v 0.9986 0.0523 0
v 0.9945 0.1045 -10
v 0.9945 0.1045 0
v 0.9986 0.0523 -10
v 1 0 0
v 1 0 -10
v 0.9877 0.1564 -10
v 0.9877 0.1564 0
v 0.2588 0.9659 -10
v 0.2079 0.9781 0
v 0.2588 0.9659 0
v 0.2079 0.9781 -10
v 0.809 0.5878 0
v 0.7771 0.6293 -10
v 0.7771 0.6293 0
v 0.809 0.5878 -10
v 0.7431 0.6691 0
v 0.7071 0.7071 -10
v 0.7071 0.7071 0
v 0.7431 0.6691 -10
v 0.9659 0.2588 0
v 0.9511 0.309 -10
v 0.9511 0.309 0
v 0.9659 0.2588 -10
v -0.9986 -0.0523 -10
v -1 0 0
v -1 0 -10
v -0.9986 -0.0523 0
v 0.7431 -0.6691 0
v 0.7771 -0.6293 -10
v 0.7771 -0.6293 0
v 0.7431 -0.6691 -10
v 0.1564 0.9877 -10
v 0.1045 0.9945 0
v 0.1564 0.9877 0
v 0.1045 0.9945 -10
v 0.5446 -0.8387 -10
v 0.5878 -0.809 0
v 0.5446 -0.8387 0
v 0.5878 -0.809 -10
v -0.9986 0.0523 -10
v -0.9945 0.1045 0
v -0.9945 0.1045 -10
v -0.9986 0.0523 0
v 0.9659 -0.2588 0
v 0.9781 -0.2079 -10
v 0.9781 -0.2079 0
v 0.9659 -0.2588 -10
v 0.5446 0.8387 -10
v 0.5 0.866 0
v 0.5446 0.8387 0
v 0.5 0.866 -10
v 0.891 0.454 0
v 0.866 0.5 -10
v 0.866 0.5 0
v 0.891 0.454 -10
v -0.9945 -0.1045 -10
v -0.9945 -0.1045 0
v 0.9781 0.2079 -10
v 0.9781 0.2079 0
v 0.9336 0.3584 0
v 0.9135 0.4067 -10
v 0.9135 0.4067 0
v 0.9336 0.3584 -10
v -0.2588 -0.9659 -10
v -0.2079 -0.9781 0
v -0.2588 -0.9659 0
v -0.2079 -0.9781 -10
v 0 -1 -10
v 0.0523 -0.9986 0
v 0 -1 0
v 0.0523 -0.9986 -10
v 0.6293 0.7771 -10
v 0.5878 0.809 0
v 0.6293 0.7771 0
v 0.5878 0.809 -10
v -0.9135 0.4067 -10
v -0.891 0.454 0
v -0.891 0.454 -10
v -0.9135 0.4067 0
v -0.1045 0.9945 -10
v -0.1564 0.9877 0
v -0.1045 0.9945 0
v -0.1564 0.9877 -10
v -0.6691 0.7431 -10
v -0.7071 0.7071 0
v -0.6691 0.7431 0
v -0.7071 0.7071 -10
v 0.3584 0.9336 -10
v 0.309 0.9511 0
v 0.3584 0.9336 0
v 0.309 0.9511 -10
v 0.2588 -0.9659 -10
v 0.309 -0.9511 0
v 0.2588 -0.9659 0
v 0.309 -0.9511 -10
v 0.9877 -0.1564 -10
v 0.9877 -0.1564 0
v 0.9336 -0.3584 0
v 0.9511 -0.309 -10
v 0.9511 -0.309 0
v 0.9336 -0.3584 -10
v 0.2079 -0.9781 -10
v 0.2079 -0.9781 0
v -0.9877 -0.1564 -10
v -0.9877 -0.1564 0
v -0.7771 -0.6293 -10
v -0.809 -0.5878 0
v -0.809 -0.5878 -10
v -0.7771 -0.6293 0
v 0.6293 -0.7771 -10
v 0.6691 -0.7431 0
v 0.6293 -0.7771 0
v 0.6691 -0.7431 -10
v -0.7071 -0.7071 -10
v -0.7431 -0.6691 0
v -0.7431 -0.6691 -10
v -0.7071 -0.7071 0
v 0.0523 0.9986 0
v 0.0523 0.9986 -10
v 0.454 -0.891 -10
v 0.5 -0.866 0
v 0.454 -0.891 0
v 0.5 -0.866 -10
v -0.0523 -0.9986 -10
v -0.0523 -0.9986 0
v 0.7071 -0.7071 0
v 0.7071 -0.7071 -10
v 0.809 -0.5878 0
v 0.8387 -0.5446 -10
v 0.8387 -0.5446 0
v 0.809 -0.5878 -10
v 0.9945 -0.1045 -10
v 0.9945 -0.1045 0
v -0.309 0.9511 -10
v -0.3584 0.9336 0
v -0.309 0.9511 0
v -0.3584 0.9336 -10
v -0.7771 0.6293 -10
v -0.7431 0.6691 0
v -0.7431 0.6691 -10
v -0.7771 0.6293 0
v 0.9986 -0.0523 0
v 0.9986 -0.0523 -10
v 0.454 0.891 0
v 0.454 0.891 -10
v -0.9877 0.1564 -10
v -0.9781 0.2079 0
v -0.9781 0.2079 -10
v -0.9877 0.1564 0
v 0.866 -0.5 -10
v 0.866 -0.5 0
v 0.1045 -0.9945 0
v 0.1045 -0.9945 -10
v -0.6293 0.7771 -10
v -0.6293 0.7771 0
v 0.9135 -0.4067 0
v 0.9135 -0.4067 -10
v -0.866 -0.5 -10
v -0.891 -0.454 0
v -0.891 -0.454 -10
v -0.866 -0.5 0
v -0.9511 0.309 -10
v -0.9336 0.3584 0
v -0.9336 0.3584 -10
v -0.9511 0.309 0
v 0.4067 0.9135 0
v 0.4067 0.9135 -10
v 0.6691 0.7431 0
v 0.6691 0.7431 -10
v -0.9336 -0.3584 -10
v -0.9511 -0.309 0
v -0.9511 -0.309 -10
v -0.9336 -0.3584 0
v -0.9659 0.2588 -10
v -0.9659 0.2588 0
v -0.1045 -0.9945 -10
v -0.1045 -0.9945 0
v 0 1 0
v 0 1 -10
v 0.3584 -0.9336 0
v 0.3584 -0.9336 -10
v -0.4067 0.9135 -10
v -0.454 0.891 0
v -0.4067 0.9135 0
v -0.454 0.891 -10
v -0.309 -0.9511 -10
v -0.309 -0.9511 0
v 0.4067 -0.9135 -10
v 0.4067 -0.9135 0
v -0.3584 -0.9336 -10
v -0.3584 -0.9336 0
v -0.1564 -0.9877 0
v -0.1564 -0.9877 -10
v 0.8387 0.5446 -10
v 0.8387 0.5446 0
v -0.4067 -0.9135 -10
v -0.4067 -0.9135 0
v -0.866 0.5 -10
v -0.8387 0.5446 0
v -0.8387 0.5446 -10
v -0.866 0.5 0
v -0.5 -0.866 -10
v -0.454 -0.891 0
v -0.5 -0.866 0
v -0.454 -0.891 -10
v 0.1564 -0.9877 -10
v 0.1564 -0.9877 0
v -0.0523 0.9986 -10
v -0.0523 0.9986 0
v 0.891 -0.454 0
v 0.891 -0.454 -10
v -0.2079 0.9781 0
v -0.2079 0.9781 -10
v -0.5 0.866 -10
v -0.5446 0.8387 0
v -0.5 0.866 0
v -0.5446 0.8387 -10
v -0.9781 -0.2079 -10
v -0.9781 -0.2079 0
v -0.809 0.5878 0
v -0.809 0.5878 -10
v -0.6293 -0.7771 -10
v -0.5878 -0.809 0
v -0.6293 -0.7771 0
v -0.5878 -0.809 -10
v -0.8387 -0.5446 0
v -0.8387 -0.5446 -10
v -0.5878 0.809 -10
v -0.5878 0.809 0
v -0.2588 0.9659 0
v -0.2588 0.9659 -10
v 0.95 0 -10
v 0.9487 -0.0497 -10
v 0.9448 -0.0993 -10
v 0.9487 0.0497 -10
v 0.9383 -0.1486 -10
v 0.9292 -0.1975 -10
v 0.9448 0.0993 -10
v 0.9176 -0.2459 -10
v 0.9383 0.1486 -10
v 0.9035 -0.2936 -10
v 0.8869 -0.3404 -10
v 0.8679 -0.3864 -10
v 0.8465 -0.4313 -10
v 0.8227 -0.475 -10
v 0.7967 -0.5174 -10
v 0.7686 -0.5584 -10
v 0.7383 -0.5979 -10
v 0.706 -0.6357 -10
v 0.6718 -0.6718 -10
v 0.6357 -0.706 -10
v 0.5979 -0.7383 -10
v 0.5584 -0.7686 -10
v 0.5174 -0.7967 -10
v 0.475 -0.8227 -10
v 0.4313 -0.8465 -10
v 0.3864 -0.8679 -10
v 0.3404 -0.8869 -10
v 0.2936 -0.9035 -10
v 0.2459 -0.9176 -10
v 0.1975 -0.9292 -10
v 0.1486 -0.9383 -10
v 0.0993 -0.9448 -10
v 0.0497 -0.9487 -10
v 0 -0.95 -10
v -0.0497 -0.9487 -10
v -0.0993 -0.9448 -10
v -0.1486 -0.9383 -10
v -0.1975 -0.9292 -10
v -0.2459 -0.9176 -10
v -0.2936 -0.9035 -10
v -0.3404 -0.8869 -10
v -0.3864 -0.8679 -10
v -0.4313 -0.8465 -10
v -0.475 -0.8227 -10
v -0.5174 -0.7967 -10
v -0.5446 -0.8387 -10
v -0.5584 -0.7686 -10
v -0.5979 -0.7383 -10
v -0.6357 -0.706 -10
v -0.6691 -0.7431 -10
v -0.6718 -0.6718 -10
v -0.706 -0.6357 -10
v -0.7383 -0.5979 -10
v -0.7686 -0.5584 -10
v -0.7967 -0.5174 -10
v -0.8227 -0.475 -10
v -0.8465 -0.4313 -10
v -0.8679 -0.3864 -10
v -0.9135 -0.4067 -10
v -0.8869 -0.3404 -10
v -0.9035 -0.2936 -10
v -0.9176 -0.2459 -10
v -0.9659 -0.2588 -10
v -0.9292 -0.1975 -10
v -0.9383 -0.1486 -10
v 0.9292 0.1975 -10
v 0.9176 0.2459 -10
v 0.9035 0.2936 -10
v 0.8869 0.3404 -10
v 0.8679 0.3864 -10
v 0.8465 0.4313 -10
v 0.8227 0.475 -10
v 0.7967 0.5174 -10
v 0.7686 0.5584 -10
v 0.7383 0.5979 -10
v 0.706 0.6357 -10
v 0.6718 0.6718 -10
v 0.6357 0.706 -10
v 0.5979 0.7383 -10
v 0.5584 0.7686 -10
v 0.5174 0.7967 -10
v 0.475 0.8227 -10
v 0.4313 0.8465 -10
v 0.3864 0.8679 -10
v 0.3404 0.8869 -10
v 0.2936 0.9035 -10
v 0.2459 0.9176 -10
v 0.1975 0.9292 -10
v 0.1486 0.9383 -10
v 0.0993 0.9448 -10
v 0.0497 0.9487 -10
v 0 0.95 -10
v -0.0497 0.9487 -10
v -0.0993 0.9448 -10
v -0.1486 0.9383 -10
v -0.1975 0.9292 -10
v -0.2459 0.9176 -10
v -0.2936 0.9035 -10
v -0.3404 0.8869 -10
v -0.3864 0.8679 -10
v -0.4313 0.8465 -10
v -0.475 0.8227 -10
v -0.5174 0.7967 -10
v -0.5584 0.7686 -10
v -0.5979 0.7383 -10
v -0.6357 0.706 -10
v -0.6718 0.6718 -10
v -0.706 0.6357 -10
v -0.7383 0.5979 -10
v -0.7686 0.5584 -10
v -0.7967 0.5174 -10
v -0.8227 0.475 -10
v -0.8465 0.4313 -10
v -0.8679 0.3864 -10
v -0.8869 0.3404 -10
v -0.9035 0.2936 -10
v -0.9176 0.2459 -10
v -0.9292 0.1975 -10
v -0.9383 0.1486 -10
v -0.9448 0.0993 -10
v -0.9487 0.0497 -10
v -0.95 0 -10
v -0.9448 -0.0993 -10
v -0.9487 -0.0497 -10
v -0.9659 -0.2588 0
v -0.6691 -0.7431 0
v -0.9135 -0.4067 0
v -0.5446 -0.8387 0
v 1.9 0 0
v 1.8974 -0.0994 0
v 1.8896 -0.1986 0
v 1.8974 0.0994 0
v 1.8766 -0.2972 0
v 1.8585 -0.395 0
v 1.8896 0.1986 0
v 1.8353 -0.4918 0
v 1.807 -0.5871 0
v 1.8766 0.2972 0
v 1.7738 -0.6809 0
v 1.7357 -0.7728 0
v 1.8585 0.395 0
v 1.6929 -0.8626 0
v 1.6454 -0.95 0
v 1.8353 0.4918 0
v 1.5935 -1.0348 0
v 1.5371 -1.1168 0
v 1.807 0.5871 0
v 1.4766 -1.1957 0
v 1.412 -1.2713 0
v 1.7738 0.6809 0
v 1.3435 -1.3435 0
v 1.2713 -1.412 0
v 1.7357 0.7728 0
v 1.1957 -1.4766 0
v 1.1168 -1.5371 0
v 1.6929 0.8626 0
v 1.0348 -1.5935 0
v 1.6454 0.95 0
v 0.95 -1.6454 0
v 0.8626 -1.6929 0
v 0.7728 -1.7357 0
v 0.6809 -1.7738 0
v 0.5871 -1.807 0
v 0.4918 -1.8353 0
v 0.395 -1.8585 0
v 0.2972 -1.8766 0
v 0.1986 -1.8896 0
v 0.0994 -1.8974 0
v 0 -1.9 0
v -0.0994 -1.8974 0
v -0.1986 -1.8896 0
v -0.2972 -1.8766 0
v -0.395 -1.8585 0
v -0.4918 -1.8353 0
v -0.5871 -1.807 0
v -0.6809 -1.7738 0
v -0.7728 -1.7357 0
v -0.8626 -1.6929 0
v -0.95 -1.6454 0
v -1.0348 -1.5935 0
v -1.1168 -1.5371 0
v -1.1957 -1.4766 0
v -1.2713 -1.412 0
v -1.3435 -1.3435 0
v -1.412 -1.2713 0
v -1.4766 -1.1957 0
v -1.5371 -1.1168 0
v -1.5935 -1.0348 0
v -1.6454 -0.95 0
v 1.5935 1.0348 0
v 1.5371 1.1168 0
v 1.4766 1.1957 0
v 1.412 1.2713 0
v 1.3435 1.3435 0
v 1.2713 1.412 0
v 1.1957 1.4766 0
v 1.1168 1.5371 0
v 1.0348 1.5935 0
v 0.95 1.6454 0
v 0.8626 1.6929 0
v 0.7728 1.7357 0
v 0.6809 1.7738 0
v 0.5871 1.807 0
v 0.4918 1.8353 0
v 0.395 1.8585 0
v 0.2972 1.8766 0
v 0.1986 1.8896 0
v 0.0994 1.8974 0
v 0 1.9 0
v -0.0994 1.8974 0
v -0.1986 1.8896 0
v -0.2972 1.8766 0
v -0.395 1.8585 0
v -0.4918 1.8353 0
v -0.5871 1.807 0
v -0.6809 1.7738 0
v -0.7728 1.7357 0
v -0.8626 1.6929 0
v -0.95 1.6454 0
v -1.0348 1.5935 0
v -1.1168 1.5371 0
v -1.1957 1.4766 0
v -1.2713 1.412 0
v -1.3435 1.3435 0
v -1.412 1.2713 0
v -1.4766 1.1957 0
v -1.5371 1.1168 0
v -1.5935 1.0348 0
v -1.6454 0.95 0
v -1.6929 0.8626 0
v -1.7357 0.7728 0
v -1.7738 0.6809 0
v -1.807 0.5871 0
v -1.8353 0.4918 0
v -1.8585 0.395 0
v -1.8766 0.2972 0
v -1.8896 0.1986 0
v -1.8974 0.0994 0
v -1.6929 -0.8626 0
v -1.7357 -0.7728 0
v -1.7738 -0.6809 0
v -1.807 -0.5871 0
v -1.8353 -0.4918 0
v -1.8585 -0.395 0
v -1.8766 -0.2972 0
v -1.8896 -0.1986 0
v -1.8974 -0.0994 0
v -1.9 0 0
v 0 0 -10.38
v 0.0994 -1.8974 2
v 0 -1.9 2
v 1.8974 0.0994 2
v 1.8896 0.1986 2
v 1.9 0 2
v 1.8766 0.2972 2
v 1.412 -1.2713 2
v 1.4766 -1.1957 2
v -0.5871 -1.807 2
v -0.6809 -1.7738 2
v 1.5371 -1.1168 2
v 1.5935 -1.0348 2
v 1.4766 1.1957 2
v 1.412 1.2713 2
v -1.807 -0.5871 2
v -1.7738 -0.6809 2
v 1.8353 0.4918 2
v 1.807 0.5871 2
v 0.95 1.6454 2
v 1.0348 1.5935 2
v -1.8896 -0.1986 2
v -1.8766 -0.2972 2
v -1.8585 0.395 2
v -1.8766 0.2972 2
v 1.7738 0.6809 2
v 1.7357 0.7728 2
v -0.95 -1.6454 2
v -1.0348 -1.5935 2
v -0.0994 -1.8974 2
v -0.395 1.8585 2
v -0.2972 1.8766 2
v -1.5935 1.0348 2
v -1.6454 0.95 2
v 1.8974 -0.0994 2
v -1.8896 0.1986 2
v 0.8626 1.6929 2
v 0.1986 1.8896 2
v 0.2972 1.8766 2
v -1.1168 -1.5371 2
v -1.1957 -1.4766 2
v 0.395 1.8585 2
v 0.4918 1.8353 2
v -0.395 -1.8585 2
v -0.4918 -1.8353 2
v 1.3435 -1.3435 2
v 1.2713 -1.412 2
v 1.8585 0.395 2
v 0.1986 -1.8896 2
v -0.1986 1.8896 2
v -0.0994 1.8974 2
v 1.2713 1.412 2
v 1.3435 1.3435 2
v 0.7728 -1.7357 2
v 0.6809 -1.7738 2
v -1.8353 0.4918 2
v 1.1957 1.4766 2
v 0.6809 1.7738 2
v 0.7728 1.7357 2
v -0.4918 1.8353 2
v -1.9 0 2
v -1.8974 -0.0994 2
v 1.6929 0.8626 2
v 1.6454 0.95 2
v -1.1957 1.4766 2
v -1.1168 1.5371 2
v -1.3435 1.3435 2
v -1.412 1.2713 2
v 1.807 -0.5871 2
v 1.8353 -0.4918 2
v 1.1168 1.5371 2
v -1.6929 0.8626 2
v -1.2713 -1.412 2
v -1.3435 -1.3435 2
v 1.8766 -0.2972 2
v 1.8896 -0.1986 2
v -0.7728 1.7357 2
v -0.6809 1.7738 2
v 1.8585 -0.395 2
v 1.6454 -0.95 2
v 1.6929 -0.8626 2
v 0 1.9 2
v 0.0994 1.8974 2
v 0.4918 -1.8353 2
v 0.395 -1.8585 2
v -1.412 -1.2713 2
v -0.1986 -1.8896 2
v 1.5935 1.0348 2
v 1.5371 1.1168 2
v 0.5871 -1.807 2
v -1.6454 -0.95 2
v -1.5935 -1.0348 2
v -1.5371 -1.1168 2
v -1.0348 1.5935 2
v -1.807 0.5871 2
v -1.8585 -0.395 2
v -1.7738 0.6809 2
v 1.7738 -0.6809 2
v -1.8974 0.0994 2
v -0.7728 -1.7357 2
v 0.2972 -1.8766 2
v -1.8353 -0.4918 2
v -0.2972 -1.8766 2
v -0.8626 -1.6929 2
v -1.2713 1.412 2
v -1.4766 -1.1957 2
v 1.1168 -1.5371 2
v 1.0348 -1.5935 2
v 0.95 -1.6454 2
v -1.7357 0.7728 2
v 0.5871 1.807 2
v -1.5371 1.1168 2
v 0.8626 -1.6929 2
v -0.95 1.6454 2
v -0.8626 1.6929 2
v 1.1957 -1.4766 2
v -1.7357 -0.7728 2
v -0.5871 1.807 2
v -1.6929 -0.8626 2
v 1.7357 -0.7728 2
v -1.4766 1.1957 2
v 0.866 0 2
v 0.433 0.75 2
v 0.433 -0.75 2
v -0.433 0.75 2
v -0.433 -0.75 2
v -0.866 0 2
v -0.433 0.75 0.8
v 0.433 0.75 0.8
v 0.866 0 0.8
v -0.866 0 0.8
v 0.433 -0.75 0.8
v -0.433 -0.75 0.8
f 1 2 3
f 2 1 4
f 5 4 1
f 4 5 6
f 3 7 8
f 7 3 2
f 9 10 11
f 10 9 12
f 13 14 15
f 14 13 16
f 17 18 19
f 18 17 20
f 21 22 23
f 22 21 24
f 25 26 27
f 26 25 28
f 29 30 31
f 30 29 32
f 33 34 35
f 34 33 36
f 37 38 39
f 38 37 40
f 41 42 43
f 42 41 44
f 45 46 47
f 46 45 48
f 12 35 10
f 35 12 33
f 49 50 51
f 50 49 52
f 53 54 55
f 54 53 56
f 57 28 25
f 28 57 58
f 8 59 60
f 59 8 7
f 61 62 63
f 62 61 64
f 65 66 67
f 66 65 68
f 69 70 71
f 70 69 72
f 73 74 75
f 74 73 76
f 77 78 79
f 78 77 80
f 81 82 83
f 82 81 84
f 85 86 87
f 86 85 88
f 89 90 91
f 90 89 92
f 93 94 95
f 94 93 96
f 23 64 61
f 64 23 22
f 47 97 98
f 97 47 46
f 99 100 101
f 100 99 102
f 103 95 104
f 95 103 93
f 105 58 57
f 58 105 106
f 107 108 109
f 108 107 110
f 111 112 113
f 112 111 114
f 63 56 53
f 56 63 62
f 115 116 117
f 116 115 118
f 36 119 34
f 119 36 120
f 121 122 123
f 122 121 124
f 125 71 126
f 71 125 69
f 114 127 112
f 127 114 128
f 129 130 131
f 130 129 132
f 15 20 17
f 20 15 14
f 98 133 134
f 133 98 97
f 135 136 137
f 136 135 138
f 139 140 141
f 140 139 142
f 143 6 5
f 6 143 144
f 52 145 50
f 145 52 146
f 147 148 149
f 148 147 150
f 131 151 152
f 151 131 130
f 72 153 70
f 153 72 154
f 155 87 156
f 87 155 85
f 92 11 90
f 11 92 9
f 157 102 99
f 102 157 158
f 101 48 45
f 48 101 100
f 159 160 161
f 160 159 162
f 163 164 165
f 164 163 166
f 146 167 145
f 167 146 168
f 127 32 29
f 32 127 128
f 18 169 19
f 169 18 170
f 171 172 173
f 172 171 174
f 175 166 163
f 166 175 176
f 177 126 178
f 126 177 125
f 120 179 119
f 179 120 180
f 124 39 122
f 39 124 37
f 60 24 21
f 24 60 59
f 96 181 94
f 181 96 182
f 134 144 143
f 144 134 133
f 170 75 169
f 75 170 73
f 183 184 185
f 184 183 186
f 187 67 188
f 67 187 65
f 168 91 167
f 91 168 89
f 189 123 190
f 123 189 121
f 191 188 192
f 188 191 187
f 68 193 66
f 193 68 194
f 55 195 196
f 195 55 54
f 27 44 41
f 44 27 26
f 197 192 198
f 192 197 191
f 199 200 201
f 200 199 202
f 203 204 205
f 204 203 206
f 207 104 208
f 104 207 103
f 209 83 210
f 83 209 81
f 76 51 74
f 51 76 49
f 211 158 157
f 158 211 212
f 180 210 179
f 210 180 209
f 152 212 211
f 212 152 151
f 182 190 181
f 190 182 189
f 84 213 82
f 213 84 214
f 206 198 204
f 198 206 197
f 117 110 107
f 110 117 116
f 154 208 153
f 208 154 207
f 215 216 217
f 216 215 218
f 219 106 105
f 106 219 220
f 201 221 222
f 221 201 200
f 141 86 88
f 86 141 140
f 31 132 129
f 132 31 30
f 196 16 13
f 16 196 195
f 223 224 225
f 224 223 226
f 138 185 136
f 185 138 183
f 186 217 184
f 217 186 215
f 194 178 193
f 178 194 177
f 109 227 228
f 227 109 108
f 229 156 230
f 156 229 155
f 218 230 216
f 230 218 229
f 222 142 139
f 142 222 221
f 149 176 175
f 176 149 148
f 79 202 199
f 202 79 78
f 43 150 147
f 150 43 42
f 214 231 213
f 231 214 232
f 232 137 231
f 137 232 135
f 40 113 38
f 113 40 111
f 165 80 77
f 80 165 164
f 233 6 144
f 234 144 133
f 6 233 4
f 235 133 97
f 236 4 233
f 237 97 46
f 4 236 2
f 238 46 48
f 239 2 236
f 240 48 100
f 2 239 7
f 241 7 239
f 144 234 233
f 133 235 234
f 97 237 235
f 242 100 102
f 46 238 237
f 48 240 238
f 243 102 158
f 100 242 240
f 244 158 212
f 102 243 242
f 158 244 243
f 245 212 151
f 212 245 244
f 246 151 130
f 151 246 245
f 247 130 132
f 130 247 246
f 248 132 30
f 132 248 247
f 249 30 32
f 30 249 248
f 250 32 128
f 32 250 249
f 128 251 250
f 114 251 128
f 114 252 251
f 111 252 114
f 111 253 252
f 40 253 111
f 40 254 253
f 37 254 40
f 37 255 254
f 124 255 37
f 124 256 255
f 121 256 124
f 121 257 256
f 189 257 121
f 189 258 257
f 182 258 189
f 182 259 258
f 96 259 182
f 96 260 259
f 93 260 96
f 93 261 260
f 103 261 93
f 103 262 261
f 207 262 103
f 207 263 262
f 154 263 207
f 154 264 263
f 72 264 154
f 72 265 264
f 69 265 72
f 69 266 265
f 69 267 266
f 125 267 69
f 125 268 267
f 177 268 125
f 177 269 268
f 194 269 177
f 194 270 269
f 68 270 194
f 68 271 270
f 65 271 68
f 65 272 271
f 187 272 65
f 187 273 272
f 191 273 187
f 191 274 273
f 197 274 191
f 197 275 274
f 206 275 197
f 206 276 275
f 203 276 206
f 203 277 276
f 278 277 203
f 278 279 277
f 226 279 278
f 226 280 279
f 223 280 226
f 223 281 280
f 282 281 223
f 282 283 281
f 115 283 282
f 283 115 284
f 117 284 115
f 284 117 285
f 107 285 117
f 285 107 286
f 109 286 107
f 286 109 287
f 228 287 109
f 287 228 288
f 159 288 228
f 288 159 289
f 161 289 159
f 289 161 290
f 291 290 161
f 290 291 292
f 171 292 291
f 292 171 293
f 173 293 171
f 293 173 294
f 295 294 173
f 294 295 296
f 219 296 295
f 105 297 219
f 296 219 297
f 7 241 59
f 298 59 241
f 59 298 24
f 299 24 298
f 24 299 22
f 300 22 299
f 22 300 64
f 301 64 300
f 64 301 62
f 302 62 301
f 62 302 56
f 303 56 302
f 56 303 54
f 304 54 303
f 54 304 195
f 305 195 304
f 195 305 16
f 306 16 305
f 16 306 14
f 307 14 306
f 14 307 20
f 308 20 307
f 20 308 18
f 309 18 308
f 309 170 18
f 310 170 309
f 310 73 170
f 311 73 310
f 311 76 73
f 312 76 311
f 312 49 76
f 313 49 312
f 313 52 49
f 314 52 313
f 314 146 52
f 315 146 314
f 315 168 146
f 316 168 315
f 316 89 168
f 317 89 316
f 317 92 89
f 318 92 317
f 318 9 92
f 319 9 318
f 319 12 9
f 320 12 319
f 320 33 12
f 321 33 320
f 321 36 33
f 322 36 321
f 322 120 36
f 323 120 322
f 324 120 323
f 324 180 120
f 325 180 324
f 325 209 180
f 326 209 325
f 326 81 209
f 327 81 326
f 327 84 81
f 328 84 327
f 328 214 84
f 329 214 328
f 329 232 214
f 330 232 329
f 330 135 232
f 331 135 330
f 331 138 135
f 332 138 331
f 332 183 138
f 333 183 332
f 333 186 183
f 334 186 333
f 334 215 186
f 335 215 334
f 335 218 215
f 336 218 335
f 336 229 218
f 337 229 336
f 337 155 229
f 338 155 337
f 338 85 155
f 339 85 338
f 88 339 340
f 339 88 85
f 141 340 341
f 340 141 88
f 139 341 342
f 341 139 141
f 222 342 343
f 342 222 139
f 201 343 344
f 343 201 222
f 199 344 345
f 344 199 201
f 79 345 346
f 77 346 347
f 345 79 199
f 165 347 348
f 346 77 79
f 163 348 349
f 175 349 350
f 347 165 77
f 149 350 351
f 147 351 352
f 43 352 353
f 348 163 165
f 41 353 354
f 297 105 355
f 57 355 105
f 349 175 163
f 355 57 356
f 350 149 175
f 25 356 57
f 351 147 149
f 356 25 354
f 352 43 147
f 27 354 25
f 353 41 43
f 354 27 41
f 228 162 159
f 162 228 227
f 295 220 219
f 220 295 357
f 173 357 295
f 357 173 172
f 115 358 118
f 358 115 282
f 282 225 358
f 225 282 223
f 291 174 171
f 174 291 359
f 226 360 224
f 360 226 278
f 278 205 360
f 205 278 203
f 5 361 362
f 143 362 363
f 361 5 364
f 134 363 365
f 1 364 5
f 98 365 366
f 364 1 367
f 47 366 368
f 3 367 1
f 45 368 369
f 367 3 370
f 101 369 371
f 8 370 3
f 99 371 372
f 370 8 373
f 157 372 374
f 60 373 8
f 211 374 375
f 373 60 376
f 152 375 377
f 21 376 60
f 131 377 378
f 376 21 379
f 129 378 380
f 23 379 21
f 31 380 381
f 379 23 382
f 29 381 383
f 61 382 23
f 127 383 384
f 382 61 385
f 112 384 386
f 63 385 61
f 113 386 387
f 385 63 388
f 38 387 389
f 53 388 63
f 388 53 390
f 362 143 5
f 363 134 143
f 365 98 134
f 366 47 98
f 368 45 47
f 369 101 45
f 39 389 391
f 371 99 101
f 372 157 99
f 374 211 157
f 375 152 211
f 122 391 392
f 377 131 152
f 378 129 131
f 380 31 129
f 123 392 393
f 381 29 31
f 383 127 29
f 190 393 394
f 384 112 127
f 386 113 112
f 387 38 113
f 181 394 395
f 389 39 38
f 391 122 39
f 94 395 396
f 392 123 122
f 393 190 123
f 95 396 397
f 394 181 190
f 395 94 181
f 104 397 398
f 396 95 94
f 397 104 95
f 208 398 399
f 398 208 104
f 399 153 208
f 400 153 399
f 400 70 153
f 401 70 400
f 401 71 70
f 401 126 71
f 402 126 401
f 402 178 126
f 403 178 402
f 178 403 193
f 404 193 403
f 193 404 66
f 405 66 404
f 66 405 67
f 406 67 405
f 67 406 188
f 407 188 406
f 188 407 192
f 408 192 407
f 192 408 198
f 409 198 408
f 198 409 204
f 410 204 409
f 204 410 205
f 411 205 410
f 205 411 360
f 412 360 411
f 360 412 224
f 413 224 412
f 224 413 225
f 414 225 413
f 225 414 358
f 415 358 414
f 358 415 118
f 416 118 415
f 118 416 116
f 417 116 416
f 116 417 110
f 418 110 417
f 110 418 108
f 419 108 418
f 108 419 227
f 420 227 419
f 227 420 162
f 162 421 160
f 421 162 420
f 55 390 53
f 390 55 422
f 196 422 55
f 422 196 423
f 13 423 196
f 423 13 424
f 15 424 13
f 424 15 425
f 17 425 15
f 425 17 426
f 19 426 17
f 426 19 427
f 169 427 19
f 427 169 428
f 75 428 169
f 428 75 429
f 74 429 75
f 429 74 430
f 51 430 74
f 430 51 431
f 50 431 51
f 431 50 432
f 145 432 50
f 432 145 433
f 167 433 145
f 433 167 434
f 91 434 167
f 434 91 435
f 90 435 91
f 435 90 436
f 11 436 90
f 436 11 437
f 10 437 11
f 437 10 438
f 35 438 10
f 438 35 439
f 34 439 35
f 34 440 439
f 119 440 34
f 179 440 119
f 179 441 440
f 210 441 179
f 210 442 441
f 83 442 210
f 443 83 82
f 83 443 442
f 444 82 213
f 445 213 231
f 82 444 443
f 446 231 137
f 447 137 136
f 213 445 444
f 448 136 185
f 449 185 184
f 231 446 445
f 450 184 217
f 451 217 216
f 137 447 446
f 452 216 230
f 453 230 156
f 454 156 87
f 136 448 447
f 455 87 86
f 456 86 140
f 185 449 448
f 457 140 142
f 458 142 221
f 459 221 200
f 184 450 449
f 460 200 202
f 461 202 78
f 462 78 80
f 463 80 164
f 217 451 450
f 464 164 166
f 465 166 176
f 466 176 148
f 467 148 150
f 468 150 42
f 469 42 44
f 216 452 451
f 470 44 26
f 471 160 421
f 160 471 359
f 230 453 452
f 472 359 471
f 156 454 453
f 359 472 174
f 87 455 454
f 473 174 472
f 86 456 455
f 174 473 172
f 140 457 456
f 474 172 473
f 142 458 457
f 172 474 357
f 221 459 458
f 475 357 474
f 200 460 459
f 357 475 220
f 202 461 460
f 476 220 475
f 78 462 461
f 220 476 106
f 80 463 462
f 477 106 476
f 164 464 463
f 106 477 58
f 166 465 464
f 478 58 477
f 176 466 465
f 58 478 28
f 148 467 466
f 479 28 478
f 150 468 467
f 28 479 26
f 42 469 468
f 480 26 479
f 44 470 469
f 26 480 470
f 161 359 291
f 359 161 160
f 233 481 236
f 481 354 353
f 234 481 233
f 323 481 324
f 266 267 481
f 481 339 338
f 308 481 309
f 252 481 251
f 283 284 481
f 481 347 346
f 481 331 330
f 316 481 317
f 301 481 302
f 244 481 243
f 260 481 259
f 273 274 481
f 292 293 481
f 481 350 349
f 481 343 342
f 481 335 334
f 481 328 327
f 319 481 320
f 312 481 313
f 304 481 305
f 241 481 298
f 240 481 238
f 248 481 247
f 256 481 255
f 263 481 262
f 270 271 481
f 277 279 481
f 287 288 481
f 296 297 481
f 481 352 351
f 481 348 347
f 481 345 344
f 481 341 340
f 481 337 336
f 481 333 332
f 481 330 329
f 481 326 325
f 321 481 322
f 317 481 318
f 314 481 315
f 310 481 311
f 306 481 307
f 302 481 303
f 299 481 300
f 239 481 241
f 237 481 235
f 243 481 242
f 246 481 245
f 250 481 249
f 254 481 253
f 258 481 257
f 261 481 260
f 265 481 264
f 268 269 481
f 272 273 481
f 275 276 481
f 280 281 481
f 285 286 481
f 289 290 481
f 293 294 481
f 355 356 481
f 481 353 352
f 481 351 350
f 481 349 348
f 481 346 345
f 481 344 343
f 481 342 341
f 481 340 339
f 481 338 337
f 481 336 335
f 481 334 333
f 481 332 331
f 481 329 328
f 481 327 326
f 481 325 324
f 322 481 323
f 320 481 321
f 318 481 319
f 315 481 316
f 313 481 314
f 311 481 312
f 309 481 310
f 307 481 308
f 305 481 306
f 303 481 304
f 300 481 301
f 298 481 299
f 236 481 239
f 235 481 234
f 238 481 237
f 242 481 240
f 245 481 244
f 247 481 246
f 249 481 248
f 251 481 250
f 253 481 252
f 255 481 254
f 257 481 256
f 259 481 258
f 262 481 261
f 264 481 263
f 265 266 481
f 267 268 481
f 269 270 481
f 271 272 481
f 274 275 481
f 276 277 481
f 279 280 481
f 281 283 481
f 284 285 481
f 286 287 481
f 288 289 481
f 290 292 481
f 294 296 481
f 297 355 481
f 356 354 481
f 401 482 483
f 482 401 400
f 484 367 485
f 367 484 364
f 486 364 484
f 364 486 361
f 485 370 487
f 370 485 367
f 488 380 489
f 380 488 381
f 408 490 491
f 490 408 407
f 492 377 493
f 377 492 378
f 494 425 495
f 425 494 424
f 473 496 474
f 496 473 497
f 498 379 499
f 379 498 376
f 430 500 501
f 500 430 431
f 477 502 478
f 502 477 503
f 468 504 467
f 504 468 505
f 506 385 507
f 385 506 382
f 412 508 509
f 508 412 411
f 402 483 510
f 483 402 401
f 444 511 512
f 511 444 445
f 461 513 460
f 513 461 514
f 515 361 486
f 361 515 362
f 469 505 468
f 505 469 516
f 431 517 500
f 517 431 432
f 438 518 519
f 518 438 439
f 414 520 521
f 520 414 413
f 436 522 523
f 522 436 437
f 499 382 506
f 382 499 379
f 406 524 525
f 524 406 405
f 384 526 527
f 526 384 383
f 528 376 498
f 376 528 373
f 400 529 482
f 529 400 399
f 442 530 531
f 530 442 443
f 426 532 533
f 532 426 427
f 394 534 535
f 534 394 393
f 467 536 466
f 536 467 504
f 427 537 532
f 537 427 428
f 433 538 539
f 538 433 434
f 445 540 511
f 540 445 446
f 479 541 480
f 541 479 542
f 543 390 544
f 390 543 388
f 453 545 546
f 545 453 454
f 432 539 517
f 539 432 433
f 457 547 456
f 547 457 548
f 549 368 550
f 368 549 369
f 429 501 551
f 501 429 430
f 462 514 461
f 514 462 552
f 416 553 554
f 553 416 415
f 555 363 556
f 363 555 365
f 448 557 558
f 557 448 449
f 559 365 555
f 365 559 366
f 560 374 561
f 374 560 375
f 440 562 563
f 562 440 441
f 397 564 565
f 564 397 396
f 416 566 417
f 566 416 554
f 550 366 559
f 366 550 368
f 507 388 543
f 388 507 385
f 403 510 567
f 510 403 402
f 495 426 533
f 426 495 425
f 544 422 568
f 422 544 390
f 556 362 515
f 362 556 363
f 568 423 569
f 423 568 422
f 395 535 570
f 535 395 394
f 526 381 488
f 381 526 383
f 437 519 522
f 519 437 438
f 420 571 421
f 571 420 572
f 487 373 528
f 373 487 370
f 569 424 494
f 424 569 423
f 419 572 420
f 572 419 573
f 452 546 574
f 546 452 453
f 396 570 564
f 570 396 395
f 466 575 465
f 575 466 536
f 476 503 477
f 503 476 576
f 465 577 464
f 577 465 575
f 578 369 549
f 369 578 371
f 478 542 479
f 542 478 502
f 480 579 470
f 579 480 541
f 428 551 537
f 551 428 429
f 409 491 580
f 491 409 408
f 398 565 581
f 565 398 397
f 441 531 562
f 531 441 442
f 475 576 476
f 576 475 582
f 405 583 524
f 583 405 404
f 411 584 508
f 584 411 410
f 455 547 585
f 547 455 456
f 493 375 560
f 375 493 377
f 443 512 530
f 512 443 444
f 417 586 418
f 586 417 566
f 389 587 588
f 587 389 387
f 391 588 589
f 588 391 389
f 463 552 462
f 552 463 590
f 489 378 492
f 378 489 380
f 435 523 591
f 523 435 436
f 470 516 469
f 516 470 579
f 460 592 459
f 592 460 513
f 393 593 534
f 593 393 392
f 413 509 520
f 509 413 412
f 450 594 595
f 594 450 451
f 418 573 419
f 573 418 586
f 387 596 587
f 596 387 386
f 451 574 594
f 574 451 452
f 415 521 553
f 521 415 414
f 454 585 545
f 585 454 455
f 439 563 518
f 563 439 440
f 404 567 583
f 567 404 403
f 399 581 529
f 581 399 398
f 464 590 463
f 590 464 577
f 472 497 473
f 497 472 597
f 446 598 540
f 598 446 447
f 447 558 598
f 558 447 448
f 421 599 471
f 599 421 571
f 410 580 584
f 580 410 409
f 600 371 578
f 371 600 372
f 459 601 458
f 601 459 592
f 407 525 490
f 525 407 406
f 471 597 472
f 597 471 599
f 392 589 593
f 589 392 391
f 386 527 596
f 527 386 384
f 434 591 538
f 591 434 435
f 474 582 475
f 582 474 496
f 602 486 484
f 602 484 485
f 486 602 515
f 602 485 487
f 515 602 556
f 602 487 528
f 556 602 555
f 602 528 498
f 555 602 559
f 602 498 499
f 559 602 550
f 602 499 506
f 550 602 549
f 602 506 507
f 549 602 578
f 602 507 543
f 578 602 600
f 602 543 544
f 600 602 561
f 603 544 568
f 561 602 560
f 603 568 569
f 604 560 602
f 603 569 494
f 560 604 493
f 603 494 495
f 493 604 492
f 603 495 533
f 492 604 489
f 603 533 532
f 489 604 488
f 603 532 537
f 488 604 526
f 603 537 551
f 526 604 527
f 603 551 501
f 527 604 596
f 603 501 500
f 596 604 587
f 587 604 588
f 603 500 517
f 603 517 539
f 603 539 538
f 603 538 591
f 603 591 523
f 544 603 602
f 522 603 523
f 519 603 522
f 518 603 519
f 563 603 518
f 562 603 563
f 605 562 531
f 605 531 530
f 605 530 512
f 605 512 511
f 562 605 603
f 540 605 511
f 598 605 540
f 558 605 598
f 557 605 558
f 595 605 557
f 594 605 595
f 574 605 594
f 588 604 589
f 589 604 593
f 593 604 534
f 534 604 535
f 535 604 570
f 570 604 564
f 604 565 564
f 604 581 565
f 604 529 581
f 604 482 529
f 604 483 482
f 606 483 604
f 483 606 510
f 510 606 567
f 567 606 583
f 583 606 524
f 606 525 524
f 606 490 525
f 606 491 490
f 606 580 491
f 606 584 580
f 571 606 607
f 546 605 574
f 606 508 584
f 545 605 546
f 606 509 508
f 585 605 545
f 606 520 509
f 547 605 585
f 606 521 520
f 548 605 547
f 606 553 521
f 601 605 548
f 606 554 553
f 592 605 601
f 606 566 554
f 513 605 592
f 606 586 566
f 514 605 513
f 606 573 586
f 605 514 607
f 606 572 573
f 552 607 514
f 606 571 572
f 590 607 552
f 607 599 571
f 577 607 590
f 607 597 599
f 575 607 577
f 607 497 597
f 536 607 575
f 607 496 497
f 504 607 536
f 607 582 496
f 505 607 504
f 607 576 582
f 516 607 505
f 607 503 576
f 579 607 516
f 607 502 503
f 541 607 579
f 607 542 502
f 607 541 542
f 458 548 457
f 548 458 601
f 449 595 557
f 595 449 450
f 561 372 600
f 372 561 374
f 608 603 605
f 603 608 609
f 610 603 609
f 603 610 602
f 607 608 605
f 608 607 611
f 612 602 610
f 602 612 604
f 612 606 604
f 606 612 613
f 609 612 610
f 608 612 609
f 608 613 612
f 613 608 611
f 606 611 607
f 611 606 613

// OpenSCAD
$fn = 120;

// Parameters (mm)
shaft_diameter = 2.0;
shaft_length   = 10.0;   // under-head length
head_diameter  = 3.8;
head_height    = 2.0;

// Internal hex socket (approx for M2 SHCS)
hex_af         = 1.5;    // across flats
socket_depth   = 1.2;

// Small details
tip_chamfer_h  = 0.4;
head_edge_chamfer_h = 0.25;
overlap = 0.02;

// --- Helpers ---
function hex_points_af(af) =
    let(r = af / sqrt(3))  // circumradius for given across-flats
    [ for (i = [0:5]) [ r*cos(60*i), r*sin(60*i) ] ];

module hex_prism_af(af, h) {
    linear_extrude(height = h)
        polygon(points = hex_points_af(af));
}

// --- Model ---
module socket_head_cap_screw() {
    difference() {
        // One connected solid: head + shaft + tip chamfer
        union() {
            // Shaft (from z = -shaft_length to z = 0)
            translate([0, 0, -shaft_length])
                cylinder(h = shaft_length, d = shaft_diameter);

            // Tip chamfer (connected to shaft end)
            translate([0, 0, -shaft_length - tip_chamfer_h + overlap])
                cylinder(h = tip_chamfer_h, d1 = 0, d2 = shaft_diameter);

            // Head (from z = 0 to z = head_height)
            cylinder(h = head_height, d = head_diameter);

            // Slight top edge chamfer to avoid a perfectly sharp rim
            translate([0, 0, head_height - head_edge_chamfer_h])
                cylinder(h = head_edge_chamfer_h, d1 = head_diameter, d2 = head_diameter - 0.3);
        }

        // Internal hex socket cut (from top face downward)
        translate([0, 0, head_height - socket_depth])
            hex_prism_af(hex_af, socket_depth + overlap);
    }
}

socket_head_cap_screw();
